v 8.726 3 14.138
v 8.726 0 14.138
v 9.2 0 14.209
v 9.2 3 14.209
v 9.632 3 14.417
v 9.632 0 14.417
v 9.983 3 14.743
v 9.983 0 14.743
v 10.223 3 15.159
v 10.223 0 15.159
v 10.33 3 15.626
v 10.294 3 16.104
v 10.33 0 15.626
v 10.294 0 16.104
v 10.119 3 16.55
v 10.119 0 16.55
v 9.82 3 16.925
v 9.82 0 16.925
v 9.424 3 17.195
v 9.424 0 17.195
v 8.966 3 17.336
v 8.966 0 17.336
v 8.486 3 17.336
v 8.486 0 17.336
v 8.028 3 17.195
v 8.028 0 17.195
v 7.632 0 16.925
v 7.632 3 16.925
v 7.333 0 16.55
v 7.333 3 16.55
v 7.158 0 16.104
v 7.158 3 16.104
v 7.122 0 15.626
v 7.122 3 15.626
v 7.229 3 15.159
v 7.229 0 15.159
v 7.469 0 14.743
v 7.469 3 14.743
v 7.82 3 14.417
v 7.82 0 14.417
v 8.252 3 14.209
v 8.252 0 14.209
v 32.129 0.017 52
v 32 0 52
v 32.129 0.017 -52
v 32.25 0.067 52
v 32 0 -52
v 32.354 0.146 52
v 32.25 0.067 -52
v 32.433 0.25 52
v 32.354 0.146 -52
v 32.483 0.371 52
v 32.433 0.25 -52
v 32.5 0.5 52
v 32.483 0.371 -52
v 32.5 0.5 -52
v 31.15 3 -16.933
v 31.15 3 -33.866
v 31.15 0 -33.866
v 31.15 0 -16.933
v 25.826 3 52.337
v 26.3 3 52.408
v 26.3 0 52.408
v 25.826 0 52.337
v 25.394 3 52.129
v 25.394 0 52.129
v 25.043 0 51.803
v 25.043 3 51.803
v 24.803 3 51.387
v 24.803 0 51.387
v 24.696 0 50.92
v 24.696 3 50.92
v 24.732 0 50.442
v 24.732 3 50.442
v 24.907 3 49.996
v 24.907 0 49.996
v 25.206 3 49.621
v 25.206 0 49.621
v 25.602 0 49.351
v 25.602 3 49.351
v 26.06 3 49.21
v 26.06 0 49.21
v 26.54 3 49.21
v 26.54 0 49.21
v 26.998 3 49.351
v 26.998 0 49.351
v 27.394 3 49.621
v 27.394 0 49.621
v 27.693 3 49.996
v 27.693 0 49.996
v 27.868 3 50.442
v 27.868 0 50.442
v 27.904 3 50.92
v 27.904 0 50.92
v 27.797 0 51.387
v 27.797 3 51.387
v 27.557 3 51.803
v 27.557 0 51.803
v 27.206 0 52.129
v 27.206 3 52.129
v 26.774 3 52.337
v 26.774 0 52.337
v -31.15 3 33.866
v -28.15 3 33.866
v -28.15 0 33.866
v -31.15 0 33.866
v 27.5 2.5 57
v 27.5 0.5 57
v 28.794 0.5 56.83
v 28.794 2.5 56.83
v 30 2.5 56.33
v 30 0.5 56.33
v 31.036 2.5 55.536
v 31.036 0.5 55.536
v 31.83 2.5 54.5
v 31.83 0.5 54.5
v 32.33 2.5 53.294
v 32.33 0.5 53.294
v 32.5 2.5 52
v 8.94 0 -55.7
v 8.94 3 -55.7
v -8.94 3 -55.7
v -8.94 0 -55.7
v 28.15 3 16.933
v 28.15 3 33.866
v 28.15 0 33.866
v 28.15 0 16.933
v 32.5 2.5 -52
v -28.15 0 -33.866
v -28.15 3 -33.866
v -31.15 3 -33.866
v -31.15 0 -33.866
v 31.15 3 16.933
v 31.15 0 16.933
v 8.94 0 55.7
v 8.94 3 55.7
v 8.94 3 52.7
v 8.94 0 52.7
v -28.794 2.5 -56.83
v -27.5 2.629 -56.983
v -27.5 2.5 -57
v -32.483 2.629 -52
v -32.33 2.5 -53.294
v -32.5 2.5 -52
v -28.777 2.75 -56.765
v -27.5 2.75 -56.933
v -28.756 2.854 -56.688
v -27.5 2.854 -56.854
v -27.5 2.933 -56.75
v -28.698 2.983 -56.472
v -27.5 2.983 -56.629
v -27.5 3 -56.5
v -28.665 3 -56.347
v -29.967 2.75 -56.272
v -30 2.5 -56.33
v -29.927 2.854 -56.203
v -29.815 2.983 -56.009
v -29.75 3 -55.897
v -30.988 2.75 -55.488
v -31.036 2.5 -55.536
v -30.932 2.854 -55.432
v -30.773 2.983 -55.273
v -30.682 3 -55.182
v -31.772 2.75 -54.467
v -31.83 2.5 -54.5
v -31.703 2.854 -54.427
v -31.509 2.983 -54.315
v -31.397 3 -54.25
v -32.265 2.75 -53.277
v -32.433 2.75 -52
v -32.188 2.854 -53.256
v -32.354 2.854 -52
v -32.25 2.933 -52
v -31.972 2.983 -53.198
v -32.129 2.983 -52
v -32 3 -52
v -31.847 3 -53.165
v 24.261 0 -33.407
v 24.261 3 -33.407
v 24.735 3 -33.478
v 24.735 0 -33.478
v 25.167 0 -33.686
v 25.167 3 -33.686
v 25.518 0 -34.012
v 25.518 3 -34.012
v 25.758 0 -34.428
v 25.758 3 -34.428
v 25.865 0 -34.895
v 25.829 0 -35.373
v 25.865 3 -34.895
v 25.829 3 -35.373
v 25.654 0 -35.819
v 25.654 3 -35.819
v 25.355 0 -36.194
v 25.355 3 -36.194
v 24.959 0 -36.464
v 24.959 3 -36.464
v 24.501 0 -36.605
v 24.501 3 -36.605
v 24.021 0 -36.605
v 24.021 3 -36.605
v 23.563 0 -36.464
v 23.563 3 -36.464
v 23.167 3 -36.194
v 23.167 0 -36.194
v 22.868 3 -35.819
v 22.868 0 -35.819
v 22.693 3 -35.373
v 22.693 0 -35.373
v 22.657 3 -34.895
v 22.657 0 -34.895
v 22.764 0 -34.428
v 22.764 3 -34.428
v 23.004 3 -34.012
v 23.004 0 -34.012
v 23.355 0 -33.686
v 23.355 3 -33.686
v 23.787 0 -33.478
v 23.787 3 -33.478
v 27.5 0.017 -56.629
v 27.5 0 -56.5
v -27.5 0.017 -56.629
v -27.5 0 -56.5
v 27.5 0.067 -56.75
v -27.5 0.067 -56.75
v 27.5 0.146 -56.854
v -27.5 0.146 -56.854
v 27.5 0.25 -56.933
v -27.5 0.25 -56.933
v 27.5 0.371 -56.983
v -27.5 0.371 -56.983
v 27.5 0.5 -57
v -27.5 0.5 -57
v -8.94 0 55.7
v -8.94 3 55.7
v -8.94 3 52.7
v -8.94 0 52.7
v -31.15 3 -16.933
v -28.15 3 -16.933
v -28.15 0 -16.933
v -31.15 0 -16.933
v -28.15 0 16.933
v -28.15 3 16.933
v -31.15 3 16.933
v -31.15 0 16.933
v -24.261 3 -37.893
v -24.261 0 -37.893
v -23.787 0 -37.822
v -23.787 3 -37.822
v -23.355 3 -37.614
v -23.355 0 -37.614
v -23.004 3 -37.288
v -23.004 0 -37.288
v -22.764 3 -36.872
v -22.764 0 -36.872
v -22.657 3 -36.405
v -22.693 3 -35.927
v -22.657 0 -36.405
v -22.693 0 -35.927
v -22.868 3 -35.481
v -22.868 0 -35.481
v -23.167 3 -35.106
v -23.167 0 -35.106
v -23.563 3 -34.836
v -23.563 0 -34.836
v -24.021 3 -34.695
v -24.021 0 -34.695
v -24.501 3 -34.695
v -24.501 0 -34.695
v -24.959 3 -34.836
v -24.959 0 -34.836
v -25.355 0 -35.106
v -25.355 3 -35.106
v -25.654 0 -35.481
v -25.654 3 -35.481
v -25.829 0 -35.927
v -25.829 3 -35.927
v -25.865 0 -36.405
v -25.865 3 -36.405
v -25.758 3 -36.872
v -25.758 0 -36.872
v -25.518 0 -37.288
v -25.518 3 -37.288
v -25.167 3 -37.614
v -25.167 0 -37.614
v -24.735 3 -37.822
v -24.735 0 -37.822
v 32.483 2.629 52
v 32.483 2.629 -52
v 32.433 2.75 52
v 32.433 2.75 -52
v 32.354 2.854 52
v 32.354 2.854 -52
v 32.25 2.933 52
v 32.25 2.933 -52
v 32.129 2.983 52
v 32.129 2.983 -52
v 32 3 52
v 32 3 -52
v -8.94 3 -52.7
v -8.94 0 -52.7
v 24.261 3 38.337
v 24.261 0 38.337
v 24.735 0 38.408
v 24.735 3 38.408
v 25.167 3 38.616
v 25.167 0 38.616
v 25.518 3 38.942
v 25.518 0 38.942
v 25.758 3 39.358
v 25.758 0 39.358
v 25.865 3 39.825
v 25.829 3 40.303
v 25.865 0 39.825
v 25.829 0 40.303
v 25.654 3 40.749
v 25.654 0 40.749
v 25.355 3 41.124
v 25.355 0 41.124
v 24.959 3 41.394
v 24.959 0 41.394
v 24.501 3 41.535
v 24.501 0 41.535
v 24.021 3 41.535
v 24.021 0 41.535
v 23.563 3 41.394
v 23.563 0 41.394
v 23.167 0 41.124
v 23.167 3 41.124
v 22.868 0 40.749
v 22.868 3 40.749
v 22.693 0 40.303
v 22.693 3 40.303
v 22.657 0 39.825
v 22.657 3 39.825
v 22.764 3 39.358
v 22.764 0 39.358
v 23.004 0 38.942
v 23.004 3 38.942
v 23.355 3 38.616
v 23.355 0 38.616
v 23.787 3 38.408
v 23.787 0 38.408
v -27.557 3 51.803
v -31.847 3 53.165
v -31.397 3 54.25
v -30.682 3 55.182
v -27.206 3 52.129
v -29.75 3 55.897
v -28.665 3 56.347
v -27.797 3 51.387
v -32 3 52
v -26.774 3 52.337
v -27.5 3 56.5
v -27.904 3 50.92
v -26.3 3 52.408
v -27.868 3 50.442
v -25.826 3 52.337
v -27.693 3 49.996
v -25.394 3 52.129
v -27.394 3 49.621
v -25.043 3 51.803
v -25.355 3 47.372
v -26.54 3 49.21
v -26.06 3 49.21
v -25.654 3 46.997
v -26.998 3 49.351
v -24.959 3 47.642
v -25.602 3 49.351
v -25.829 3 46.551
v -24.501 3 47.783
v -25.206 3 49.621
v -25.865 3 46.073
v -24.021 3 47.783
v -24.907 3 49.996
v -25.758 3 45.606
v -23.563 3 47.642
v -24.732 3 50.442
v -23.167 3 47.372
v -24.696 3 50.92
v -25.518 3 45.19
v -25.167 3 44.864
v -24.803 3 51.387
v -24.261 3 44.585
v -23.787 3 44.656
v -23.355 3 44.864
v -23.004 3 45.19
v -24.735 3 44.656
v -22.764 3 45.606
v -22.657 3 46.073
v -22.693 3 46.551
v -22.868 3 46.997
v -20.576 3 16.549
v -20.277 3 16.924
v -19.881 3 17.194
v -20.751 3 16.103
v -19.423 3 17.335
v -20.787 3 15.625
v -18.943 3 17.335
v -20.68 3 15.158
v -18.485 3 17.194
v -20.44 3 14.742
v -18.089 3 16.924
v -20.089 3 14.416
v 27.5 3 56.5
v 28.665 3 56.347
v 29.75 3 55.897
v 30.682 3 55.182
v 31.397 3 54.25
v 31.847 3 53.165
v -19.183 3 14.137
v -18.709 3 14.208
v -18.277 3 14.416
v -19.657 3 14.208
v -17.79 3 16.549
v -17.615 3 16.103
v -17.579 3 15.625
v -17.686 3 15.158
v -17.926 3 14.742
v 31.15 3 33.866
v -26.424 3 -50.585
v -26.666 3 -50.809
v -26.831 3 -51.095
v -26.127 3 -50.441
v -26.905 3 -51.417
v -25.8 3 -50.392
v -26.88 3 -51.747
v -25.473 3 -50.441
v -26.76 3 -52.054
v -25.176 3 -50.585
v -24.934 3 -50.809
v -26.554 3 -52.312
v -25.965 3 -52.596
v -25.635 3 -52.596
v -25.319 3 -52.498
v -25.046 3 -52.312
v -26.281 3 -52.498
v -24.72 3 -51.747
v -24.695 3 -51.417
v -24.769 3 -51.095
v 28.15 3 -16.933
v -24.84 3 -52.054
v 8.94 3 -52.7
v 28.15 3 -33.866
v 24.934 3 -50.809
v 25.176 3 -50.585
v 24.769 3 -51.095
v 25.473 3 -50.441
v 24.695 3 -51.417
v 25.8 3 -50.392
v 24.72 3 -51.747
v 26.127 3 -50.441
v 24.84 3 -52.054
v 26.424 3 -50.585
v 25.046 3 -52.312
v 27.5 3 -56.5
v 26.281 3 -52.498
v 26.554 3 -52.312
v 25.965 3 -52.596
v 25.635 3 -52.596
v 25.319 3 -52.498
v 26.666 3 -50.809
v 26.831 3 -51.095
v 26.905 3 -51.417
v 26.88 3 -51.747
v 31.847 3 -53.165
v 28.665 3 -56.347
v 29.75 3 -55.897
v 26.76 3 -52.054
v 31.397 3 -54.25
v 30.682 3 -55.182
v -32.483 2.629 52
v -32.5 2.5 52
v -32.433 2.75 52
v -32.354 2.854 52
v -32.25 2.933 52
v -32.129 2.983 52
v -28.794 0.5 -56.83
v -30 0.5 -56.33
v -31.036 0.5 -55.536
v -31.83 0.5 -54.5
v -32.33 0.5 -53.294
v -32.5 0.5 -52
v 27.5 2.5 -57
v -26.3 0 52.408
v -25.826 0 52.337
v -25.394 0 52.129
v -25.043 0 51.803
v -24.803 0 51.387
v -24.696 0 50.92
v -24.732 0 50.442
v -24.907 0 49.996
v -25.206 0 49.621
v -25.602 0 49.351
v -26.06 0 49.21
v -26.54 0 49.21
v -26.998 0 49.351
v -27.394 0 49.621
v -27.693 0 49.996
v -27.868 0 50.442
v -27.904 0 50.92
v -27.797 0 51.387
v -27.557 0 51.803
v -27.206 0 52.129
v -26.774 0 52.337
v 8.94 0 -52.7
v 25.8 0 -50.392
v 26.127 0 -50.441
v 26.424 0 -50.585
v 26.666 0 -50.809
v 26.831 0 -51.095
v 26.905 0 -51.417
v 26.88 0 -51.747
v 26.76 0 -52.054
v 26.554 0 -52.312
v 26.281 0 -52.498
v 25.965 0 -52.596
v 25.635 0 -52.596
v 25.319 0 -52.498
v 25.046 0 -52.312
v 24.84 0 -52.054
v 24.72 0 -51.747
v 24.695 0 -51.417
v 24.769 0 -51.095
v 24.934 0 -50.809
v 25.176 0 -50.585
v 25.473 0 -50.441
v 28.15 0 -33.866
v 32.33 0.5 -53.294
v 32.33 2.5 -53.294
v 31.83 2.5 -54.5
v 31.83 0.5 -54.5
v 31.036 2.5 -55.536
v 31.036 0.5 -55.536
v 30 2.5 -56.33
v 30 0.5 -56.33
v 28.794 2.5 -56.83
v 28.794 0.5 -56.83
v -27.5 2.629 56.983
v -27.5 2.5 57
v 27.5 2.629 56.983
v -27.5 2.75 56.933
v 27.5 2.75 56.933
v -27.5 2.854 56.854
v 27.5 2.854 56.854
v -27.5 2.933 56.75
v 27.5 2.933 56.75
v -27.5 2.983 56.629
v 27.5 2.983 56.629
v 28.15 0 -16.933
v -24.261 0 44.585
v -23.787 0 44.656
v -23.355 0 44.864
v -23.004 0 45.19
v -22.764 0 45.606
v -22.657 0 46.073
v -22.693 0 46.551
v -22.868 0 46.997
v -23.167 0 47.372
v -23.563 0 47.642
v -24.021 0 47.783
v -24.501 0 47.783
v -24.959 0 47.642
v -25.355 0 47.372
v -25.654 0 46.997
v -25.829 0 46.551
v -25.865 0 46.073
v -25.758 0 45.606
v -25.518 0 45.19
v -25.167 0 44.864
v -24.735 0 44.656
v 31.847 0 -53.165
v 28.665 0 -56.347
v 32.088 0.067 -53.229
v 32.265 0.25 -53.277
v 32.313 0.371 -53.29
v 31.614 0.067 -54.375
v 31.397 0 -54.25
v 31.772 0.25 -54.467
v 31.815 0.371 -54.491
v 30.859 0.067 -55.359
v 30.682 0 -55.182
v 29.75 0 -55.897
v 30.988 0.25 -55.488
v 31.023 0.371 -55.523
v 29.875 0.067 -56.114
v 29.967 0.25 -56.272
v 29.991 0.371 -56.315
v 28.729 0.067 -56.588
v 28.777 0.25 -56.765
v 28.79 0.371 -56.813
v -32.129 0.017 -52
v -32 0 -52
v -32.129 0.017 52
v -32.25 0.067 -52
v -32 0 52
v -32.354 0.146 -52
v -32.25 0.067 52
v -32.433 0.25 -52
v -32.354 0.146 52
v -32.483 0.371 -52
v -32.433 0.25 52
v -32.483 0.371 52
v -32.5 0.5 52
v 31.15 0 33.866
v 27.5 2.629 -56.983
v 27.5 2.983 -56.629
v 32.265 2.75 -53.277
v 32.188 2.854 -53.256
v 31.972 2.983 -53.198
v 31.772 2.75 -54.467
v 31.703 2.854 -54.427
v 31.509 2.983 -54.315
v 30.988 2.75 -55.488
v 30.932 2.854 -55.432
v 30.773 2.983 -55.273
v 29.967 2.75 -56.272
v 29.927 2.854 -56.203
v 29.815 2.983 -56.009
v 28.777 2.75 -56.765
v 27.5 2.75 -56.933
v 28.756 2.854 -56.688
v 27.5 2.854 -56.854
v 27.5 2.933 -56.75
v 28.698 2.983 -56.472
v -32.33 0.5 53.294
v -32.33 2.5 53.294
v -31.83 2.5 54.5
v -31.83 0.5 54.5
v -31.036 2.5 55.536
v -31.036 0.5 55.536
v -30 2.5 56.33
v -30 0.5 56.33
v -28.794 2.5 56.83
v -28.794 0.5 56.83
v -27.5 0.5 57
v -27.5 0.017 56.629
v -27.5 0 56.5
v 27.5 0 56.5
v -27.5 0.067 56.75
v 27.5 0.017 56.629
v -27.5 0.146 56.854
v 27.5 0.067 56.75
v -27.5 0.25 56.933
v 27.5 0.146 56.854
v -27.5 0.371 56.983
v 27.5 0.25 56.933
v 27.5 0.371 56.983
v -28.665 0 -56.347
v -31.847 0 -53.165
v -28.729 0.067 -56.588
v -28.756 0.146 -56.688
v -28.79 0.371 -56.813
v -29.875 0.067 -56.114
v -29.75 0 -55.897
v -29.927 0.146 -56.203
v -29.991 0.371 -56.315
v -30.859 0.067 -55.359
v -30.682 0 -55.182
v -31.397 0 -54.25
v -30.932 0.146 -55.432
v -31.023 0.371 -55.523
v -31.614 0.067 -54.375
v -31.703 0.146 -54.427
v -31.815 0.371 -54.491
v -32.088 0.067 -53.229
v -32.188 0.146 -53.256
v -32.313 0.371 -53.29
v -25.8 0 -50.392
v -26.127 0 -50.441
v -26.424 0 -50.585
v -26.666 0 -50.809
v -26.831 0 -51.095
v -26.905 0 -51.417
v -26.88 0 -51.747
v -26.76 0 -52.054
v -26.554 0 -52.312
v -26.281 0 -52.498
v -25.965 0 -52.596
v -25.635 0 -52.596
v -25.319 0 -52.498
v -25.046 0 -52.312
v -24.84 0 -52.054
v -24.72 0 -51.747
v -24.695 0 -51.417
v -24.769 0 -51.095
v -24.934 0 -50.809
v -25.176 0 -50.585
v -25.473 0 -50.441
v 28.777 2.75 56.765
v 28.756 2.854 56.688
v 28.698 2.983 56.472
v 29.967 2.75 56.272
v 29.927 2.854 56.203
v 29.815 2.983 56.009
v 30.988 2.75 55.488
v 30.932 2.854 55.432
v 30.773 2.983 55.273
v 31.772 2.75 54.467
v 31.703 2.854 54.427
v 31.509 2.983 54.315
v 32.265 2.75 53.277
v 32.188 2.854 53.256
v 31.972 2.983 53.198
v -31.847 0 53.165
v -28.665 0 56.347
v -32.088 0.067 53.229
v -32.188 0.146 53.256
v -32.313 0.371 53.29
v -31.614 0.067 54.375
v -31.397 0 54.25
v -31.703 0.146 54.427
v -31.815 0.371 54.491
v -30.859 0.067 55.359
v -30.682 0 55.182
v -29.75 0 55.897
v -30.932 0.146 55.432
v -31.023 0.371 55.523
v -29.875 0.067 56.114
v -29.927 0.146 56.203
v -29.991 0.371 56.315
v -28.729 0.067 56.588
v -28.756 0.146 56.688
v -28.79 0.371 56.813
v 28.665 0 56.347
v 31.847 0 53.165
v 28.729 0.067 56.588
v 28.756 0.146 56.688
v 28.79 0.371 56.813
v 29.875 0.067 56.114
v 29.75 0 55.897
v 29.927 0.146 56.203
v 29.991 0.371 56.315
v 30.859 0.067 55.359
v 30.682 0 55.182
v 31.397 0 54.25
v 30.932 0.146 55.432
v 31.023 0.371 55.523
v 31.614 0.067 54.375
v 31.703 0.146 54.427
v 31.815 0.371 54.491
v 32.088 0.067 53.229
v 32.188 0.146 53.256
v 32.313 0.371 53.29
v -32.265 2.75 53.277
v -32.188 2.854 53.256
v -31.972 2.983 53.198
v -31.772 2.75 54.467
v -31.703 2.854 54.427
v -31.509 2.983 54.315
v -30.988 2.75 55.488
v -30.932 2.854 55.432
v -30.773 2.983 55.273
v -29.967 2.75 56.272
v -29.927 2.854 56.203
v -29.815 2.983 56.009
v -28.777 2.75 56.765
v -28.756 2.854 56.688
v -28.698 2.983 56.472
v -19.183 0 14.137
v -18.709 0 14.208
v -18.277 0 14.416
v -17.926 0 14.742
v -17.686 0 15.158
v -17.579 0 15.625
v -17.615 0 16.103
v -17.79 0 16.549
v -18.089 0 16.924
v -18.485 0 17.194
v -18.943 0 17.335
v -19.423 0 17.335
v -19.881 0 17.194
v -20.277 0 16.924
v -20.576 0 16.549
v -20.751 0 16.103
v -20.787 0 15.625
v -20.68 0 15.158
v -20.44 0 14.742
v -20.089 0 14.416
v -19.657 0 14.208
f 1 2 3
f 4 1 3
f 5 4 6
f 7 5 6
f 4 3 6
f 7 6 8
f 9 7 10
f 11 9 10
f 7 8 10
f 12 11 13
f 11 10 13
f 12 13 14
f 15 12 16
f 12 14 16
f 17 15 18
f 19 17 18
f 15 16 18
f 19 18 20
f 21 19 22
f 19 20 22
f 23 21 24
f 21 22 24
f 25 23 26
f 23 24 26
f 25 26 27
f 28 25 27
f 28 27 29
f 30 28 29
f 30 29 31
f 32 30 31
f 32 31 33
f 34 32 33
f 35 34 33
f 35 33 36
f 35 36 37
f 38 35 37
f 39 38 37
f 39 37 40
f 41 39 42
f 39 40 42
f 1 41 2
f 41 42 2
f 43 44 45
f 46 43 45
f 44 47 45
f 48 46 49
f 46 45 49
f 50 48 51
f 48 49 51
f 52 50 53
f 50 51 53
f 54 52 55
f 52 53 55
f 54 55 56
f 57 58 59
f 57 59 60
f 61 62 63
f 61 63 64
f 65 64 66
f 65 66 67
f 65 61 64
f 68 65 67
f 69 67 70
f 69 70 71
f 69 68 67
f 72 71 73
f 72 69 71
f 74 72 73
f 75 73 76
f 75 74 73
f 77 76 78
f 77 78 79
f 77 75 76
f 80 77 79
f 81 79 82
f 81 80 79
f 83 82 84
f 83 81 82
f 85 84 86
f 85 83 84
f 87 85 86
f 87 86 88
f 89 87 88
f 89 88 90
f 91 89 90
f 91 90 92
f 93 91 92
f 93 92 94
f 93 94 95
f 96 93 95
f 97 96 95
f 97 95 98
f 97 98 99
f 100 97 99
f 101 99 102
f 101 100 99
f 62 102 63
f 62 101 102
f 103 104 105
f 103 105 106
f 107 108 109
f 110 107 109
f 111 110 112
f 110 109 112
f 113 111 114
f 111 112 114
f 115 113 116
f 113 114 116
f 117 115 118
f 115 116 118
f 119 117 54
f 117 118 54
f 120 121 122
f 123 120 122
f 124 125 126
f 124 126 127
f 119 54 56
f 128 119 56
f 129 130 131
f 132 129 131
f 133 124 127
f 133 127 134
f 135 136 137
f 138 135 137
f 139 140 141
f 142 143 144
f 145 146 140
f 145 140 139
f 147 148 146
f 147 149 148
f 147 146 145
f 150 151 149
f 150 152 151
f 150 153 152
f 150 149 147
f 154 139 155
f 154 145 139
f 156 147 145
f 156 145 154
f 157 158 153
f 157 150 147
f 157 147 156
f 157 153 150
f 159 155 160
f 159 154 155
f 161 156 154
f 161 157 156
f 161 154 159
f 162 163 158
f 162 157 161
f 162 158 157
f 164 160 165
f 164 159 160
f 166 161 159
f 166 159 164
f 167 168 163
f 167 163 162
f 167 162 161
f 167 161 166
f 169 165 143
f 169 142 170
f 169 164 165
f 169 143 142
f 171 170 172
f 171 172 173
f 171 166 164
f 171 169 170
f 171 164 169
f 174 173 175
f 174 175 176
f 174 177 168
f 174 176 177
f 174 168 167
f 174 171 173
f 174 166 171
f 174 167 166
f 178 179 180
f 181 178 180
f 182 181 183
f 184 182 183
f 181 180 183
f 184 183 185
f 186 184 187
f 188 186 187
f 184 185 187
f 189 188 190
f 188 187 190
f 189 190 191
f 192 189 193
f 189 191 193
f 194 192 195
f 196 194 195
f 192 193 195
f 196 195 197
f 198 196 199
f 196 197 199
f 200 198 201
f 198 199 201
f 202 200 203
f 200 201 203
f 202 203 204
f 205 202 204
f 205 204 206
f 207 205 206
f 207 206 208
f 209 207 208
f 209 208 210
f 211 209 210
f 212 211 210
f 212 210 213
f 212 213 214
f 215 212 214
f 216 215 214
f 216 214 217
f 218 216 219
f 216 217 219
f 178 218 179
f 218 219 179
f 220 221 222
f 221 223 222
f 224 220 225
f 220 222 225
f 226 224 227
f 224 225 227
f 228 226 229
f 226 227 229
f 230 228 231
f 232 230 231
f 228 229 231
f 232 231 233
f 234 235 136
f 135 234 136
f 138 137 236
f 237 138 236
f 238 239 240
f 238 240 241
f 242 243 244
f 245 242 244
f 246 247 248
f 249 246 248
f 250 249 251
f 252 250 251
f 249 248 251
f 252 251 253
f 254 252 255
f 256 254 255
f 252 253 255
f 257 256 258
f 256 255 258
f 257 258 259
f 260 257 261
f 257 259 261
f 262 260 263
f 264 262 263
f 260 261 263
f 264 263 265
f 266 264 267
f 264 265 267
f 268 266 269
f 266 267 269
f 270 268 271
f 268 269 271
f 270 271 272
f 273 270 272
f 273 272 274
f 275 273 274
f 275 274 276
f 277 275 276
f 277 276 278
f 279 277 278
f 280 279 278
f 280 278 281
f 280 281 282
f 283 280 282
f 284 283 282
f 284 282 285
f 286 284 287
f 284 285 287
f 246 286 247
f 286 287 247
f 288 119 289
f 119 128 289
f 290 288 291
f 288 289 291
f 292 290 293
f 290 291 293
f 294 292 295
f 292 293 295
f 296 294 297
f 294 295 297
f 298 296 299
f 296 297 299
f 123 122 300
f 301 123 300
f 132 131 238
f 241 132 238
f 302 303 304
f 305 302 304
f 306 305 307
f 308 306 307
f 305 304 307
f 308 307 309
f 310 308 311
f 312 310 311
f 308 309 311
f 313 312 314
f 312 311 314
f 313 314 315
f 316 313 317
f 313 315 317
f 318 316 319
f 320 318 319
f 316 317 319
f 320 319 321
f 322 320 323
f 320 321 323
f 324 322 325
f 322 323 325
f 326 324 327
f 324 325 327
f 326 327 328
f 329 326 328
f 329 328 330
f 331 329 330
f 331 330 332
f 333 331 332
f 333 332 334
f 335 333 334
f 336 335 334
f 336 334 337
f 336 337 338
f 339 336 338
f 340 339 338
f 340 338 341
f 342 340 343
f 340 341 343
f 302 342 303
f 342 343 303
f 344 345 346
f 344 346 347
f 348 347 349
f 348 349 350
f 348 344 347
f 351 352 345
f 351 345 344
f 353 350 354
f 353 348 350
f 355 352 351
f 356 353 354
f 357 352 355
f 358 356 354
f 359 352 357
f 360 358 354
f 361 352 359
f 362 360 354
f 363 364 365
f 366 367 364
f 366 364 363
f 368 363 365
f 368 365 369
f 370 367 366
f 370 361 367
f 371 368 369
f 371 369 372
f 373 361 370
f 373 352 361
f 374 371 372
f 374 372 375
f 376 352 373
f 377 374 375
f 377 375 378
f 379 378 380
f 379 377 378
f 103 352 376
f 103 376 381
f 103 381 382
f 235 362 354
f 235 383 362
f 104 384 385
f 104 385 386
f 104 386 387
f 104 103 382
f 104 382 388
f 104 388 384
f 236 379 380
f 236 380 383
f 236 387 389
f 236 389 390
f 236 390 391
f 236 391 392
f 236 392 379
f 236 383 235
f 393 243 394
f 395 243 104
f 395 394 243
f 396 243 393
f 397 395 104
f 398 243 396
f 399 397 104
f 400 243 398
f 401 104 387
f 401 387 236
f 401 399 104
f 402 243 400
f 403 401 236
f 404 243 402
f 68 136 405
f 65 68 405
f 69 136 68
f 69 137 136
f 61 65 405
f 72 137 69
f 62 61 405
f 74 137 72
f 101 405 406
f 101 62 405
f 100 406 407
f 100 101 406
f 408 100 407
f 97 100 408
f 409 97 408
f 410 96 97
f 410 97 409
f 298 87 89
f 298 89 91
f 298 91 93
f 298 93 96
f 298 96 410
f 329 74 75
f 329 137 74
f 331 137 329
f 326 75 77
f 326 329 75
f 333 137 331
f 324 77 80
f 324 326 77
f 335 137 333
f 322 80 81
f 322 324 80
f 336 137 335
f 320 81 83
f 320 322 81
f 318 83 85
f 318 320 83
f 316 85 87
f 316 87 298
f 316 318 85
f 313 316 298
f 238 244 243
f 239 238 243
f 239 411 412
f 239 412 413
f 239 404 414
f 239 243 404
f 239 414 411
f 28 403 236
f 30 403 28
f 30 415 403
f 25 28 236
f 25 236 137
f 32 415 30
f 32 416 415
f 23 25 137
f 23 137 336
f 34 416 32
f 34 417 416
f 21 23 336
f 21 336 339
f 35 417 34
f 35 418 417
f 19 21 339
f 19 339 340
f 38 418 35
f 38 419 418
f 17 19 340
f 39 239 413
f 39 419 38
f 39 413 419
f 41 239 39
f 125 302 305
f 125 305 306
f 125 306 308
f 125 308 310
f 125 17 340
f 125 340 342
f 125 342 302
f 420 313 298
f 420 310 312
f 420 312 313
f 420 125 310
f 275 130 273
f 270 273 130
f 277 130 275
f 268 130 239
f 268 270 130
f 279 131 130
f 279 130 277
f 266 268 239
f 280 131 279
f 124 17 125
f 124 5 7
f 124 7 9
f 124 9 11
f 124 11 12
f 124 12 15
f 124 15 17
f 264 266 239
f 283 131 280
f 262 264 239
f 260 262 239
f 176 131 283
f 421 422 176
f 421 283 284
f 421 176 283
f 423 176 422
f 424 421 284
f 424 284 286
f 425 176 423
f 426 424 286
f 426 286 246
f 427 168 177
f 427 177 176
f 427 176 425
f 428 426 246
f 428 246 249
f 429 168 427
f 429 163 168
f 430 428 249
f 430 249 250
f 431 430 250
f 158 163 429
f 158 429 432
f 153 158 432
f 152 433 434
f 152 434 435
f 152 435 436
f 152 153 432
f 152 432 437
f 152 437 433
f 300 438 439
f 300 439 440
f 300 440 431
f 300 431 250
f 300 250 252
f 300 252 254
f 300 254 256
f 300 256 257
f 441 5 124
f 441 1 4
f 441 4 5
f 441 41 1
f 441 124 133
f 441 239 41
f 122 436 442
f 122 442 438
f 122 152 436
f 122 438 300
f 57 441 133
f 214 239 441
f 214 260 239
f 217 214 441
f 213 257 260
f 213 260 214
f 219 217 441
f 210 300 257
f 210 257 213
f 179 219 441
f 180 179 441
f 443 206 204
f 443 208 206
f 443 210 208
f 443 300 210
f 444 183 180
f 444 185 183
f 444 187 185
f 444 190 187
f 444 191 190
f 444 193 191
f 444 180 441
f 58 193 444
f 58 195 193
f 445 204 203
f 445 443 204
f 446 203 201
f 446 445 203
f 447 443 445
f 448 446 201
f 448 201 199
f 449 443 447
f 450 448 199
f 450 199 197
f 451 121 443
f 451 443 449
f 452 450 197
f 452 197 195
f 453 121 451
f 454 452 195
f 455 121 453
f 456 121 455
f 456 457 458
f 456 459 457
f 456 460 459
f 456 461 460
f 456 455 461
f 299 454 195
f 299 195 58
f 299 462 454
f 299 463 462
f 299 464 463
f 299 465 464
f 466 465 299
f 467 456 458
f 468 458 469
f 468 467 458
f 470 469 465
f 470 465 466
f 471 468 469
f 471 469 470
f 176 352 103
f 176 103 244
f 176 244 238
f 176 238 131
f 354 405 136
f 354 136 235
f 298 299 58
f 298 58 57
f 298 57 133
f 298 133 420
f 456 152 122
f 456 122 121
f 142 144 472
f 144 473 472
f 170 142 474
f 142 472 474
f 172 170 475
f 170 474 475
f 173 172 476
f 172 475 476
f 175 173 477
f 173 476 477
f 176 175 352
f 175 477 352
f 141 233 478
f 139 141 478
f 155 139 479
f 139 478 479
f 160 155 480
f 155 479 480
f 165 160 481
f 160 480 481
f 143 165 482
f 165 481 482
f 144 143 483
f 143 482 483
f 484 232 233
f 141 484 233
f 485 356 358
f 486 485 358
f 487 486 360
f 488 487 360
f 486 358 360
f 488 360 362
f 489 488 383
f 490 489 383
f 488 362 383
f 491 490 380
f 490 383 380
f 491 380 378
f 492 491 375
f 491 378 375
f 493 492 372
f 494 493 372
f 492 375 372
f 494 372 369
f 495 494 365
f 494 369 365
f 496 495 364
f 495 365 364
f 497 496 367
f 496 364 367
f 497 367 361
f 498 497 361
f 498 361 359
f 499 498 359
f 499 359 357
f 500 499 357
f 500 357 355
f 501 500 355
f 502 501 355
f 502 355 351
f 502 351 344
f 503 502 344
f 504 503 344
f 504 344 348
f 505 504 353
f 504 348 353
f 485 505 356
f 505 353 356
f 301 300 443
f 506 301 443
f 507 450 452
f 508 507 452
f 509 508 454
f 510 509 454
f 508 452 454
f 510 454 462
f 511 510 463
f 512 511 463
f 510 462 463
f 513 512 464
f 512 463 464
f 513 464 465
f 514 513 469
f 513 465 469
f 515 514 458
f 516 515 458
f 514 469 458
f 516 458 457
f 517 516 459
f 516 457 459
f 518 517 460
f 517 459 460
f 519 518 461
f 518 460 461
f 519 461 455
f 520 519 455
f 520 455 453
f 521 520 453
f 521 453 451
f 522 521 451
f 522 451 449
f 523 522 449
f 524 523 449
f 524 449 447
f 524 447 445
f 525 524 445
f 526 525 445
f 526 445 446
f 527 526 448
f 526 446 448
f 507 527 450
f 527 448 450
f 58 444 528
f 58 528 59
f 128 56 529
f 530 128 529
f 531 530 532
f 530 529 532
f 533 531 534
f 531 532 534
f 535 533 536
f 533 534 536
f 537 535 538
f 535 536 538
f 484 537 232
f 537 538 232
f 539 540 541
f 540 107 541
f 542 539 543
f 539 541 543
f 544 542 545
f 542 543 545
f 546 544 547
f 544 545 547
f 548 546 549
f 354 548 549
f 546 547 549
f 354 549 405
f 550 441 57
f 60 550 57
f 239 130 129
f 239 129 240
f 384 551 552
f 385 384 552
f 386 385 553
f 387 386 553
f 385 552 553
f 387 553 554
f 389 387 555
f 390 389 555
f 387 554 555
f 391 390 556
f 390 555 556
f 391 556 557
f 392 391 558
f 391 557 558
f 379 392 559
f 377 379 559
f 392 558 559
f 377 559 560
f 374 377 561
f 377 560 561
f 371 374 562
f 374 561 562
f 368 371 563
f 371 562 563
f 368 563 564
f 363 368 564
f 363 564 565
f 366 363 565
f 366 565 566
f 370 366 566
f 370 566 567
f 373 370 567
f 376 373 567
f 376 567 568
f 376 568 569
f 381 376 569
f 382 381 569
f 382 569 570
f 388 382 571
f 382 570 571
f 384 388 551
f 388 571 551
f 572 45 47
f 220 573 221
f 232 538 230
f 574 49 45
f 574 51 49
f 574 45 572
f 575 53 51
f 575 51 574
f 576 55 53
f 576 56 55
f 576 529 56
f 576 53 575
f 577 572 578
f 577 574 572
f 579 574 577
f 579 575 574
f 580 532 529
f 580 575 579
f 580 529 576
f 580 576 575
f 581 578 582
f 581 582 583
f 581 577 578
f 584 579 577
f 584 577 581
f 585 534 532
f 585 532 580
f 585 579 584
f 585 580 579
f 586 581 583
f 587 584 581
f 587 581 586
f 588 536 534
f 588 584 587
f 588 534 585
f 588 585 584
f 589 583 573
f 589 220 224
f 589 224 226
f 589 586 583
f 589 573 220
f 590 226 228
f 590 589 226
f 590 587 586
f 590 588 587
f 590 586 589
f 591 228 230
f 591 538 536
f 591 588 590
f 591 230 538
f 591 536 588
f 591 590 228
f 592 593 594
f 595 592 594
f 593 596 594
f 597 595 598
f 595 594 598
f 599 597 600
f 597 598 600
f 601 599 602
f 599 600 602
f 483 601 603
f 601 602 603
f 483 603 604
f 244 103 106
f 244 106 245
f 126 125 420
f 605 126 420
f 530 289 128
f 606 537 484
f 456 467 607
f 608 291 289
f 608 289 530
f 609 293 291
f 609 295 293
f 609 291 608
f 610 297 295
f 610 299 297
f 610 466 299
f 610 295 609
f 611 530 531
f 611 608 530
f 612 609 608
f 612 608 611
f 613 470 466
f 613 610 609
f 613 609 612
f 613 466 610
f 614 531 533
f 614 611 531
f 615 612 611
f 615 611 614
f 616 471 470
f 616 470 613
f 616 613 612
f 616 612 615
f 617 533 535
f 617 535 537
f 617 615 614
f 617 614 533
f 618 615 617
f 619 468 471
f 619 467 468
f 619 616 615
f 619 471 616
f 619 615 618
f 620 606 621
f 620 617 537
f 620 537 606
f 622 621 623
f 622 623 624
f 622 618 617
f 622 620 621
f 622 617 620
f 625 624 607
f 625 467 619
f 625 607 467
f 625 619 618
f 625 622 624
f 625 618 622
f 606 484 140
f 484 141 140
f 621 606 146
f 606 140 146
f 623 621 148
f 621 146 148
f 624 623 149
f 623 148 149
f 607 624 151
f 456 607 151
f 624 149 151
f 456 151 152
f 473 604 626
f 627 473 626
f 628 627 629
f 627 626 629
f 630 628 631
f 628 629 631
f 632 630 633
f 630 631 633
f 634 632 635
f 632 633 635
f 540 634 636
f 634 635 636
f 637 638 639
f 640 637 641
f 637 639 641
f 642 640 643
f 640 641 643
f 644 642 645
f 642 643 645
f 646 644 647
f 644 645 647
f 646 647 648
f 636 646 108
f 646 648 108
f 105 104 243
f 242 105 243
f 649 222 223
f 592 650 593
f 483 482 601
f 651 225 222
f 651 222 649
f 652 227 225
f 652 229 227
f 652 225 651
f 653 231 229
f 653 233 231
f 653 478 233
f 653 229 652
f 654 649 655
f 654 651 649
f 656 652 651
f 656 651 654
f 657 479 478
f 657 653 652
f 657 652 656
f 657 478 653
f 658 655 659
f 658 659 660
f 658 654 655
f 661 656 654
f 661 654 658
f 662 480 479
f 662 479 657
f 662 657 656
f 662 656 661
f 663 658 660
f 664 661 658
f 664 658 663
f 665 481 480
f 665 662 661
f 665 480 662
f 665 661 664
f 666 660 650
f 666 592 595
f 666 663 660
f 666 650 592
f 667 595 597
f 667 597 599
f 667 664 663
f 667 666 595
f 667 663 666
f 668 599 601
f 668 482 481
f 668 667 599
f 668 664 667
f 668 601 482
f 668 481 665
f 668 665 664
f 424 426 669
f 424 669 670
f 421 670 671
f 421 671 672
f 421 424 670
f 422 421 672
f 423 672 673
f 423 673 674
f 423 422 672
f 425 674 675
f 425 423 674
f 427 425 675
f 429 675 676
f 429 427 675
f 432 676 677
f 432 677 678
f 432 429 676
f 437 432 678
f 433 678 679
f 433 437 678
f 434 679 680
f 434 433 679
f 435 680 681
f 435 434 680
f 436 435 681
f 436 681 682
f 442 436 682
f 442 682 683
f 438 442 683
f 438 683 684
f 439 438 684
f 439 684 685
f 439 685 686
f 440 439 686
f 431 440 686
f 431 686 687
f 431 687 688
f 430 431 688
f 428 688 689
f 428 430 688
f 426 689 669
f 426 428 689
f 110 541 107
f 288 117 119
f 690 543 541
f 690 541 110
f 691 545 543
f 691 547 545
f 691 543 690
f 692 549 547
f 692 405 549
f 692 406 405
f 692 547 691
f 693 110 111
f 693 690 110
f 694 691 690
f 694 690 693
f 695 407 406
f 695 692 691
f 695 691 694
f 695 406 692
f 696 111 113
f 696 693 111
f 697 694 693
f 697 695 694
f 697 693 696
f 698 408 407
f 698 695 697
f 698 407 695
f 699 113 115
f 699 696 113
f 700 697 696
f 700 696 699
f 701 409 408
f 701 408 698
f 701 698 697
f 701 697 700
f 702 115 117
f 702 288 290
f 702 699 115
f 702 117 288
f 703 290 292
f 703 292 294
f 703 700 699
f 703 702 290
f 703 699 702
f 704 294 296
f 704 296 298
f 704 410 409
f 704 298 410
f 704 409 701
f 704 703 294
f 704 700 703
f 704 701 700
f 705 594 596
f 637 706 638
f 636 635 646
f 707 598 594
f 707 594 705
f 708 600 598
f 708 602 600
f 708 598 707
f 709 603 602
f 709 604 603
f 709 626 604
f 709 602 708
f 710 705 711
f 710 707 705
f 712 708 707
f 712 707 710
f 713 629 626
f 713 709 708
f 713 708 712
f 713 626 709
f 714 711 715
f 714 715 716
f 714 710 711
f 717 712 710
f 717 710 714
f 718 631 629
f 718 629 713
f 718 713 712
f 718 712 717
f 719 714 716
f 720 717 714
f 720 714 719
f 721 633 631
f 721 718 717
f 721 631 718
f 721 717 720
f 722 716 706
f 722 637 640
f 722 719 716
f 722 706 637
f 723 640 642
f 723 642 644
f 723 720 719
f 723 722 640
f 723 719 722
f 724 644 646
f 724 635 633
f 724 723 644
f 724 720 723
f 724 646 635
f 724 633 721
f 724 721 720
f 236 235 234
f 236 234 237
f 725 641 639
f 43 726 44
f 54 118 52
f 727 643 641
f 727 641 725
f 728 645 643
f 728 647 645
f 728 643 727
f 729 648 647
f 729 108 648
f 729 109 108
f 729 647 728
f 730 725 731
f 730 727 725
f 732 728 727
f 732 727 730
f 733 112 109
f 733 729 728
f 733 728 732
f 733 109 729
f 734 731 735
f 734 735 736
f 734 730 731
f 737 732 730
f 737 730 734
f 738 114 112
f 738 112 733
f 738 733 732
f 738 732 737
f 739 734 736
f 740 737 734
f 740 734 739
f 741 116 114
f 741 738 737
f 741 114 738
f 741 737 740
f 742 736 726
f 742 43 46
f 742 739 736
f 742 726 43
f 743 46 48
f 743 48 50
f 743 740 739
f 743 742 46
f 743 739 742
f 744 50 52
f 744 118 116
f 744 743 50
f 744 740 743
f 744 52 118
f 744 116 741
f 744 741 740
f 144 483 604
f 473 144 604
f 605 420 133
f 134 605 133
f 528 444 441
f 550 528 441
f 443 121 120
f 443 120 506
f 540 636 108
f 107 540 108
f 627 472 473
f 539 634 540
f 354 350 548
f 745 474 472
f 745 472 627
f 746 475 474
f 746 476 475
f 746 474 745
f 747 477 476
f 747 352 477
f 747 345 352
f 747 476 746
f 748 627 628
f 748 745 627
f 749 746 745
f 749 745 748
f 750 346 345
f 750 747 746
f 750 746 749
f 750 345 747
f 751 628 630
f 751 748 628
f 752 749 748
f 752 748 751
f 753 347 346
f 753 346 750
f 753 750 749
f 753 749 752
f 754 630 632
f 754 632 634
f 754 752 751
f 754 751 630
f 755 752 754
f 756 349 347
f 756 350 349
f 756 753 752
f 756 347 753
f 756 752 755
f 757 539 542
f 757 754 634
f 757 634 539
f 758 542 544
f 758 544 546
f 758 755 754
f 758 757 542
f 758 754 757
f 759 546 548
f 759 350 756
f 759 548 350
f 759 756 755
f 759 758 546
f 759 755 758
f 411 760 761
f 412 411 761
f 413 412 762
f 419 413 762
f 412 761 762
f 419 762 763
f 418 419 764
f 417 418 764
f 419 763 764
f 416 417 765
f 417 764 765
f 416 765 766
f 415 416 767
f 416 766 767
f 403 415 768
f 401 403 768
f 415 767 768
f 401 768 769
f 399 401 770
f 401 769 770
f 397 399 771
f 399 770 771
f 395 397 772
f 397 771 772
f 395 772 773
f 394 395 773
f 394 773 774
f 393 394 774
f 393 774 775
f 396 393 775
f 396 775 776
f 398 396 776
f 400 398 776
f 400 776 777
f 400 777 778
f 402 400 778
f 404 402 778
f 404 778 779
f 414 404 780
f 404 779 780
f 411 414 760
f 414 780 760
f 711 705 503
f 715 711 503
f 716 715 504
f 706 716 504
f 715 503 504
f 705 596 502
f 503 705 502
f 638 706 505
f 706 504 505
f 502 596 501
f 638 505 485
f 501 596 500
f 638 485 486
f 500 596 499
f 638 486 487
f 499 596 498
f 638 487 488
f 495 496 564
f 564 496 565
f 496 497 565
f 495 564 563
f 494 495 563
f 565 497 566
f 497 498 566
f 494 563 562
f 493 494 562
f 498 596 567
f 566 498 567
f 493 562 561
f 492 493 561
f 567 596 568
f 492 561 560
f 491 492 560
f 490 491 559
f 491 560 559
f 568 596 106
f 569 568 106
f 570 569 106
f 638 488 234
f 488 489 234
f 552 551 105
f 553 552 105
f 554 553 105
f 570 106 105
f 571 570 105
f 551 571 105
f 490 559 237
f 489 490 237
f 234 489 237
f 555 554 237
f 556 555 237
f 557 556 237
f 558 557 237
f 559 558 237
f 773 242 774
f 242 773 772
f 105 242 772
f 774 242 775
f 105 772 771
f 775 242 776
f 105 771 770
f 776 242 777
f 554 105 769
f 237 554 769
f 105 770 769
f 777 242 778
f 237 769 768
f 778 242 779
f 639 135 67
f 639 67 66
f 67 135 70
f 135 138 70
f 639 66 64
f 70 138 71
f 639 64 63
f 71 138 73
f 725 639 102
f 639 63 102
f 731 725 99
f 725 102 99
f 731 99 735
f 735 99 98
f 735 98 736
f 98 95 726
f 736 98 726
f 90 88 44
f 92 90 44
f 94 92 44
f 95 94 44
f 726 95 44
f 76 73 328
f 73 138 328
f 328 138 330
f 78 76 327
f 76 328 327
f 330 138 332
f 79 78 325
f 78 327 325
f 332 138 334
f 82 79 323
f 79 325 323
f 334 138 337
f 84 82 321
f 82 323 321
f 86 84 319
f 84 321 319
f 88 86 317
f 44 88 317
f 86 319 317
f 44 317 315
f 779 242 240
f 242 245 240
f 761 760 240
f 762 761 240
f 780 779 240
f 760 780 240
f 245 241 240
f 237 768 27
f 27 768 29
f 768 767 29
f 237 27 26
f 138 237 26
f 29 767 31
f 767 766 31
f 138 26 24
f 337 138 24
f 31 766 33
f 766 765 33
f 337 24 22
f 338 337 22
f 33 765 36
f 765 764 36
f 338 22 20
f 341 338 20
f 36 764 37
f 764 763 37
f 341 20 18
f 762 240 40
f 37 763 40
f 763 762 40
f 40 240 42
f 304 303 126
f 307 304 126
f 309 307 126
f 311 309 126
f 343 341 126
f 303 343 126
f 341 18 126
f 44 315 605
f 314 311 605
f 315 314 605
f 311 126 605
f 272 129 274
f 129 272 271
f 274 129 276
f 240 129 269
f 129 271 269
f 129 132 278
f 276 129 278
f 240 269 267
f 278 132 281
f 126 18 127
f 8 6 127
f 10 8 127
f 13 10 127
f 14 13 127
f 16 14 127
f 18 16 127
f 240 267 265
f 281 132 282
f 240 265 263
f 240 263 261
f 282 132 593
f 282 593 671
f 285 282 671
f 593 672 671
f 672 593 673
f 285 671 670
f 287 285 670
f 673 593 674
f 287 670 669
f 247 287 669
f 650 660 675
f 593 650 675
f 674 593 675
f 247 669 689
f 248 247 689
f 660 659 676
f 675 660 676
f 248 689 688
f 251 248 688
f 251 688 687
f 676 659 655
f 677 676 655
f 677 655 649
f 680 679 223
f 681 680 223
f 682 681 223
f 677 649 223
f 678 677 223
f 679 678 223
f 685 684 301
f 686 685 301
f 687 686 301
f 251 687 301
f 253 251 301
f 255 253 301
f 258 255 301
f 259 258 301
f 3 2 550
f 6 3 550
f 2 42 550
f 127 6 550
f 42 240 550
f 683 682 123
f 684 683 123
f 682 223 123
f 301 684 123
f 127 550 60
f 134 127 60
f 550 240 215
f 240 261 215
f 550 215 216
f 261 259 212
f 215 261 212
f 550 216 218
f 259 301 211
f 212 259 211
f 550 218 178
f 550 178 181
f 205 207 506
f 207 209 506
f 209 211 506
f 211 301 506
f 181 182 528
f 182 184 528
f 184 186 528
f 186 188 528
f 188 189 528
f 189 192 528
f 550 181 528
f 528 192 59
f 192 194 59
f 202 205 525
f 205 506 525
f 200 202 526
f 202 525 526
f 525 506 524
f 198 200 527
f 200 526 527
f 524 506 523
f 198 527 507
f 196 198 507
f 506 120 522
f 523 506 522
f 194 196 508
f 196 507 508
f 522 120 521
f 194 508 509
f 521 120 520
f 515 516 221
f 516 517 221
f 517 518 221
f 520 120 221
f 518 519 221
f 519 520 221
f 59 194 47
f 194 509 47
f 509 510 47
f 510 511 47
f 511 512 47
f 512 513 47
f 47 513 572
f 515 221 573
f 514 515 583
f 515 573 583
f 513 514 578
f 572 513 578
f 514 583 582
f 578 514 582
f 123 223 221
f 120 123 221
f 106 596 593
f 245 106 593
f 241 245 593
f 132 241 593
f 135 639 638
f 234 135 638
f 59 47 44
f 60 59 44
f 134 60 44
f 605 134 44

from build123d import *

# Parameters (mm, degrees)
BOSS_EXTRUDE3_DEPTH       = 3
SKETCH2_R                 = 1.608
CUT_EXTRUDE3_DEPTH        = 3
SKETCH7_R                 = 1.608
CUT_EXTRUDE8_DEPTH        = 3
SKETCH8_R                 = 1.608
CUT_EXTRUDE9_DEPTH        = 3
SKETCH9_R                 = 1.608
CUT_EXTRUDE11_DEPTH       = 3
SKETCH10_W                = 17.87
SKETCH10_H                = 3
SKETCH10_W_2              = 3
SKETCH10_H_2              = 16.933
CUT_EXTRUDE14_DEPTH       = 3
MIRROR4_COPY_1_SKETCH_W   = 17.87
MIRROR4_COPY_1_SKETCH_H   = 3
MIRROR4_COPY_1_SKETCH_W_2 = 3
MIRROR4_COPY_1_SKETCH_H_2 = 16.933
MIRROR4_COPY_1_DEPTH      = 3
SKETCH11_R                = 1.608
CUT_EXTRUDE15_DEPTH       = 3
FILLET1_R                 = 0.5
FILLET2_R                 = 0.5
SKETCH12_R                = 1.108
CUT_EXTRUDE16_DEPTH       = 3


with BuildPart() as part:
    # Sketch1 → Boss-Extrude3 (new body)
    with BuildSketch(Plane(origin=(0, 0, 0), x_dir=(1, 0, 0), z_dir=(0, 1, 0))):
        with BuildLine():
            Line((-32.5, -47), (-32.5, -52))
            ThreePointArc((-32.5, -52), (-31.035533906, -55.535533906), (-27.5, -57))
            Line((-27.5, -57), (-22.5, -57))
            Line((-22.5, -57), (22.5, -57))
            Line((22.5, -57), (27.5, -57))
            ThreePointArc((27.5, -57), (31.035533906, -55.535533906), (32.5, -52))
            Line((32.5, -52), (32.5, -47))
            Line((32.5, -47), (32.5, 47))
            Line((32.5, 47), (32.5, 52))
            ThreePointArc((32.5, 52), (31.035533906, 55.535533906), (27.5, 57))
            Line((27.5, 57), (22.5, 57))
            Line((22.5, 57), (-22.5, 57))
            Line((-22.5, 57), (-27.5, 57))
            ThreePointArc((-27.5, 57), (-31.035533906, 55.535533906), (-32.5, 52))
            Line((-32.5, 52), (-32.5, 47))
            Line((-32.5, 47), (-32.5, -47))
        make_face()
    extrude(amount=BOSS_EXTRUDE3_DEPTH)

    # Sketch2 → Cut-Extrude3 (cut)
    with BuildSketch(Plane(origin=(0, 3, 0), x_dir=(1, 0, 0), z_dir=(0, 1, 0))):
        with Locations(Location((24.261, 35.015, 0), (0, 0, 270))):
            Circle(SKETCH2_R)
    extrude(amount=-CUT_EXTRUDE3_DEPTH, mode=Mode.SUBTRACT)

    # Sketch7 → Cut-Extrude8 (cut)
    with BuildSketch(Plane.XZ):
        with Locations(Location((24.261, 39.945, 0), (0, 0, 270))):
            Circle(SKETCH7_R)
    extrude(amount=-CUT_EXTRUDE8_DEPTH, mode=Mode.SUBTRACT)

    # Sketch8 → Cut-Extrude9 (cut)
    with BuildSketch(Plane.XZ):
        with Locations(Location((-24.261, -36.285, 0), (0, 0, 270))):
            Circle(SKETCH8_R)
    extrude(amount=-CUT_EXTRUDE9_DEPTH, mode=Mode.SUBTRACT)

    # Sketch9 → Cut-Extrude11 (cut)
    with BuildSketch(Plane.XZ):
        with Locations(Location((-19.183, 15.745, 0), (0, 0, 270))):
            Circle(SKETCH9_R)
        with Locations(Location((8.725999982, 15.746, 0), (0, 0, 270))):
            Circle(SKETCH9_R)
        with Locations(Location((-24.261, 46.193, 0), (0, 0, 270))):
            Circle(SKETCH9_R)
    extrude(amount=-CUT_EXTRUDE11_DEPTH, mode=Mode.SUBTRACT)

    # Sketch10 → Cut-Extrude14 (cut)
    with BuildSketch(Plane(origin=(0, 3, 0), x_dir=(1, 0, 0), z_dir=(0, 1, 0))):
        with Locations((-0.005, -54.2)):
            Rectangle(SKETCH10_W, SKETCH10_H)
        with Locations((29.65, -25.3995)):
            Rectangle(SKETCH10_W_2, SKETCH10_H_2)
    cut_extrude14 = extrude(amount=-CUT_EXTRUDE14_DEPTH, mode=Mode.SUBTRACT)

    # Mirror3: Cut-Extrude14 across plane
    add(cut_extrude14.mirror(Plane.XY), mode=Mode.SUBTRACT)

    # Mirror4: Cut-Extrude14 across plane
    add(cut_extrude14.mirror(Plane(origin=(0, 0, 0), x_dir=(0, 0, 1), z_dir=(1, 0, 0))), mode=Mode.SUBTRACT)

    # Mirror4 copy 1 sketch → Mirror4 copy 1 (cut)
    with BuildSketch(Plane(origin=(0, 3, 0), x_dir=(-1, 0, 0), z_dir=(0, 1, 0))):
        with Locations((-0.005, -54.2)):
            Rectangle(MIRROR4_COPY_1_SKETCH_W, MIRROR4_COPY_1_SKETCH_H)
        with Locations((29.65, -25.3995)):
            Rectangle(MIRROR4_COPY_1_SKETCH_W_2, MIRROR4_COPY_1_SKETCH_H_2)
    extrude(amount=-MIRROR4_COPY_1_DEPTH, mode=Mode.SUBTRACT)

    # Sketch11 → Cut-Extrude15 (cut)
    with BuildSketch(Plane(origin=(0, 3, 0), x_dir=(1, 0, 0), z_dir=(0, 1, 0))):
        with Locations(Location((-26.3, -50.8, 0), (0, 0, 270))):
            Circle(SKETCH11_R)
    cut_extrude15 = extrude(amount=-CUT_EXTRUDE15_DEPTH, mode=Mode.SUBTRACT)

    # Mirror5: Cut-Extrude15 across plane
    add(cut_extrude15.mirror(Plane(origin=(0, 0, 0), x_dir=(0, 0, 1), z_dir=(1, 0, 0))), mode=Mode.SUBTRACT)

    # Fillet1
    fillet1_edges = [part.edges().sort_by_distance(p)[0] for p in [
        (0, 0, -57),
        (31.035533906, 0, -55.535533906),
        (32.5, 0, 0),
        (31.035533906, 0, 55.535533906),
        (0, 0, 57),
        (-31.035533906, 0, 55.535533906),
        (-32.5, 0, 0),
        (-31.035533906, 0, -55.535533906),
    ]]
    fillet(fillet1_edges, radius=FILLET1_R)

    # Fillet2
    fillet2_edges = [part.edges().sort_by_distance(p)[0] for p in [
        (-32.5, 3, 0),
        (-31.035533906, 3, 55.535533906),
        (0, 3, 57),
        (31.035533906, 3, 55.535533906),
        (32.5, 3, 0),
        (0, 3, -57),
        (31.035533906, 3, -55.535533906),
        (-31.035533906, 3, -55.535533906),
    ]]
    fillet(fillet2_edges, radius=FILLET2_R)

    # Sketch12 → Cut-Extrude16 (cut)
    with BuildSketch(Plane(origin=(0, 3, 0), x_dir=(1, 0, 0), z_dir=(0, 1, 0))):
        with Locations(Location((25.8, 51.5, 0), (0, 0, 270))):
            Circle(SKETCH12_R)
    cut_extrude16 = extrude(amount=-CUT_EXTRUDE16_DEPTH, mode=Mode.SUBTRACT)

    # Mirror8: Cut-Extrude16 across plane
    add(cut_extrude16.mirror(Plane(origin=(0, 0, 0), x_dir=(0, 0, 1), z_dir=(1, 0, 0))), mode=Mode.SUBTRACT)


solid = part.part
